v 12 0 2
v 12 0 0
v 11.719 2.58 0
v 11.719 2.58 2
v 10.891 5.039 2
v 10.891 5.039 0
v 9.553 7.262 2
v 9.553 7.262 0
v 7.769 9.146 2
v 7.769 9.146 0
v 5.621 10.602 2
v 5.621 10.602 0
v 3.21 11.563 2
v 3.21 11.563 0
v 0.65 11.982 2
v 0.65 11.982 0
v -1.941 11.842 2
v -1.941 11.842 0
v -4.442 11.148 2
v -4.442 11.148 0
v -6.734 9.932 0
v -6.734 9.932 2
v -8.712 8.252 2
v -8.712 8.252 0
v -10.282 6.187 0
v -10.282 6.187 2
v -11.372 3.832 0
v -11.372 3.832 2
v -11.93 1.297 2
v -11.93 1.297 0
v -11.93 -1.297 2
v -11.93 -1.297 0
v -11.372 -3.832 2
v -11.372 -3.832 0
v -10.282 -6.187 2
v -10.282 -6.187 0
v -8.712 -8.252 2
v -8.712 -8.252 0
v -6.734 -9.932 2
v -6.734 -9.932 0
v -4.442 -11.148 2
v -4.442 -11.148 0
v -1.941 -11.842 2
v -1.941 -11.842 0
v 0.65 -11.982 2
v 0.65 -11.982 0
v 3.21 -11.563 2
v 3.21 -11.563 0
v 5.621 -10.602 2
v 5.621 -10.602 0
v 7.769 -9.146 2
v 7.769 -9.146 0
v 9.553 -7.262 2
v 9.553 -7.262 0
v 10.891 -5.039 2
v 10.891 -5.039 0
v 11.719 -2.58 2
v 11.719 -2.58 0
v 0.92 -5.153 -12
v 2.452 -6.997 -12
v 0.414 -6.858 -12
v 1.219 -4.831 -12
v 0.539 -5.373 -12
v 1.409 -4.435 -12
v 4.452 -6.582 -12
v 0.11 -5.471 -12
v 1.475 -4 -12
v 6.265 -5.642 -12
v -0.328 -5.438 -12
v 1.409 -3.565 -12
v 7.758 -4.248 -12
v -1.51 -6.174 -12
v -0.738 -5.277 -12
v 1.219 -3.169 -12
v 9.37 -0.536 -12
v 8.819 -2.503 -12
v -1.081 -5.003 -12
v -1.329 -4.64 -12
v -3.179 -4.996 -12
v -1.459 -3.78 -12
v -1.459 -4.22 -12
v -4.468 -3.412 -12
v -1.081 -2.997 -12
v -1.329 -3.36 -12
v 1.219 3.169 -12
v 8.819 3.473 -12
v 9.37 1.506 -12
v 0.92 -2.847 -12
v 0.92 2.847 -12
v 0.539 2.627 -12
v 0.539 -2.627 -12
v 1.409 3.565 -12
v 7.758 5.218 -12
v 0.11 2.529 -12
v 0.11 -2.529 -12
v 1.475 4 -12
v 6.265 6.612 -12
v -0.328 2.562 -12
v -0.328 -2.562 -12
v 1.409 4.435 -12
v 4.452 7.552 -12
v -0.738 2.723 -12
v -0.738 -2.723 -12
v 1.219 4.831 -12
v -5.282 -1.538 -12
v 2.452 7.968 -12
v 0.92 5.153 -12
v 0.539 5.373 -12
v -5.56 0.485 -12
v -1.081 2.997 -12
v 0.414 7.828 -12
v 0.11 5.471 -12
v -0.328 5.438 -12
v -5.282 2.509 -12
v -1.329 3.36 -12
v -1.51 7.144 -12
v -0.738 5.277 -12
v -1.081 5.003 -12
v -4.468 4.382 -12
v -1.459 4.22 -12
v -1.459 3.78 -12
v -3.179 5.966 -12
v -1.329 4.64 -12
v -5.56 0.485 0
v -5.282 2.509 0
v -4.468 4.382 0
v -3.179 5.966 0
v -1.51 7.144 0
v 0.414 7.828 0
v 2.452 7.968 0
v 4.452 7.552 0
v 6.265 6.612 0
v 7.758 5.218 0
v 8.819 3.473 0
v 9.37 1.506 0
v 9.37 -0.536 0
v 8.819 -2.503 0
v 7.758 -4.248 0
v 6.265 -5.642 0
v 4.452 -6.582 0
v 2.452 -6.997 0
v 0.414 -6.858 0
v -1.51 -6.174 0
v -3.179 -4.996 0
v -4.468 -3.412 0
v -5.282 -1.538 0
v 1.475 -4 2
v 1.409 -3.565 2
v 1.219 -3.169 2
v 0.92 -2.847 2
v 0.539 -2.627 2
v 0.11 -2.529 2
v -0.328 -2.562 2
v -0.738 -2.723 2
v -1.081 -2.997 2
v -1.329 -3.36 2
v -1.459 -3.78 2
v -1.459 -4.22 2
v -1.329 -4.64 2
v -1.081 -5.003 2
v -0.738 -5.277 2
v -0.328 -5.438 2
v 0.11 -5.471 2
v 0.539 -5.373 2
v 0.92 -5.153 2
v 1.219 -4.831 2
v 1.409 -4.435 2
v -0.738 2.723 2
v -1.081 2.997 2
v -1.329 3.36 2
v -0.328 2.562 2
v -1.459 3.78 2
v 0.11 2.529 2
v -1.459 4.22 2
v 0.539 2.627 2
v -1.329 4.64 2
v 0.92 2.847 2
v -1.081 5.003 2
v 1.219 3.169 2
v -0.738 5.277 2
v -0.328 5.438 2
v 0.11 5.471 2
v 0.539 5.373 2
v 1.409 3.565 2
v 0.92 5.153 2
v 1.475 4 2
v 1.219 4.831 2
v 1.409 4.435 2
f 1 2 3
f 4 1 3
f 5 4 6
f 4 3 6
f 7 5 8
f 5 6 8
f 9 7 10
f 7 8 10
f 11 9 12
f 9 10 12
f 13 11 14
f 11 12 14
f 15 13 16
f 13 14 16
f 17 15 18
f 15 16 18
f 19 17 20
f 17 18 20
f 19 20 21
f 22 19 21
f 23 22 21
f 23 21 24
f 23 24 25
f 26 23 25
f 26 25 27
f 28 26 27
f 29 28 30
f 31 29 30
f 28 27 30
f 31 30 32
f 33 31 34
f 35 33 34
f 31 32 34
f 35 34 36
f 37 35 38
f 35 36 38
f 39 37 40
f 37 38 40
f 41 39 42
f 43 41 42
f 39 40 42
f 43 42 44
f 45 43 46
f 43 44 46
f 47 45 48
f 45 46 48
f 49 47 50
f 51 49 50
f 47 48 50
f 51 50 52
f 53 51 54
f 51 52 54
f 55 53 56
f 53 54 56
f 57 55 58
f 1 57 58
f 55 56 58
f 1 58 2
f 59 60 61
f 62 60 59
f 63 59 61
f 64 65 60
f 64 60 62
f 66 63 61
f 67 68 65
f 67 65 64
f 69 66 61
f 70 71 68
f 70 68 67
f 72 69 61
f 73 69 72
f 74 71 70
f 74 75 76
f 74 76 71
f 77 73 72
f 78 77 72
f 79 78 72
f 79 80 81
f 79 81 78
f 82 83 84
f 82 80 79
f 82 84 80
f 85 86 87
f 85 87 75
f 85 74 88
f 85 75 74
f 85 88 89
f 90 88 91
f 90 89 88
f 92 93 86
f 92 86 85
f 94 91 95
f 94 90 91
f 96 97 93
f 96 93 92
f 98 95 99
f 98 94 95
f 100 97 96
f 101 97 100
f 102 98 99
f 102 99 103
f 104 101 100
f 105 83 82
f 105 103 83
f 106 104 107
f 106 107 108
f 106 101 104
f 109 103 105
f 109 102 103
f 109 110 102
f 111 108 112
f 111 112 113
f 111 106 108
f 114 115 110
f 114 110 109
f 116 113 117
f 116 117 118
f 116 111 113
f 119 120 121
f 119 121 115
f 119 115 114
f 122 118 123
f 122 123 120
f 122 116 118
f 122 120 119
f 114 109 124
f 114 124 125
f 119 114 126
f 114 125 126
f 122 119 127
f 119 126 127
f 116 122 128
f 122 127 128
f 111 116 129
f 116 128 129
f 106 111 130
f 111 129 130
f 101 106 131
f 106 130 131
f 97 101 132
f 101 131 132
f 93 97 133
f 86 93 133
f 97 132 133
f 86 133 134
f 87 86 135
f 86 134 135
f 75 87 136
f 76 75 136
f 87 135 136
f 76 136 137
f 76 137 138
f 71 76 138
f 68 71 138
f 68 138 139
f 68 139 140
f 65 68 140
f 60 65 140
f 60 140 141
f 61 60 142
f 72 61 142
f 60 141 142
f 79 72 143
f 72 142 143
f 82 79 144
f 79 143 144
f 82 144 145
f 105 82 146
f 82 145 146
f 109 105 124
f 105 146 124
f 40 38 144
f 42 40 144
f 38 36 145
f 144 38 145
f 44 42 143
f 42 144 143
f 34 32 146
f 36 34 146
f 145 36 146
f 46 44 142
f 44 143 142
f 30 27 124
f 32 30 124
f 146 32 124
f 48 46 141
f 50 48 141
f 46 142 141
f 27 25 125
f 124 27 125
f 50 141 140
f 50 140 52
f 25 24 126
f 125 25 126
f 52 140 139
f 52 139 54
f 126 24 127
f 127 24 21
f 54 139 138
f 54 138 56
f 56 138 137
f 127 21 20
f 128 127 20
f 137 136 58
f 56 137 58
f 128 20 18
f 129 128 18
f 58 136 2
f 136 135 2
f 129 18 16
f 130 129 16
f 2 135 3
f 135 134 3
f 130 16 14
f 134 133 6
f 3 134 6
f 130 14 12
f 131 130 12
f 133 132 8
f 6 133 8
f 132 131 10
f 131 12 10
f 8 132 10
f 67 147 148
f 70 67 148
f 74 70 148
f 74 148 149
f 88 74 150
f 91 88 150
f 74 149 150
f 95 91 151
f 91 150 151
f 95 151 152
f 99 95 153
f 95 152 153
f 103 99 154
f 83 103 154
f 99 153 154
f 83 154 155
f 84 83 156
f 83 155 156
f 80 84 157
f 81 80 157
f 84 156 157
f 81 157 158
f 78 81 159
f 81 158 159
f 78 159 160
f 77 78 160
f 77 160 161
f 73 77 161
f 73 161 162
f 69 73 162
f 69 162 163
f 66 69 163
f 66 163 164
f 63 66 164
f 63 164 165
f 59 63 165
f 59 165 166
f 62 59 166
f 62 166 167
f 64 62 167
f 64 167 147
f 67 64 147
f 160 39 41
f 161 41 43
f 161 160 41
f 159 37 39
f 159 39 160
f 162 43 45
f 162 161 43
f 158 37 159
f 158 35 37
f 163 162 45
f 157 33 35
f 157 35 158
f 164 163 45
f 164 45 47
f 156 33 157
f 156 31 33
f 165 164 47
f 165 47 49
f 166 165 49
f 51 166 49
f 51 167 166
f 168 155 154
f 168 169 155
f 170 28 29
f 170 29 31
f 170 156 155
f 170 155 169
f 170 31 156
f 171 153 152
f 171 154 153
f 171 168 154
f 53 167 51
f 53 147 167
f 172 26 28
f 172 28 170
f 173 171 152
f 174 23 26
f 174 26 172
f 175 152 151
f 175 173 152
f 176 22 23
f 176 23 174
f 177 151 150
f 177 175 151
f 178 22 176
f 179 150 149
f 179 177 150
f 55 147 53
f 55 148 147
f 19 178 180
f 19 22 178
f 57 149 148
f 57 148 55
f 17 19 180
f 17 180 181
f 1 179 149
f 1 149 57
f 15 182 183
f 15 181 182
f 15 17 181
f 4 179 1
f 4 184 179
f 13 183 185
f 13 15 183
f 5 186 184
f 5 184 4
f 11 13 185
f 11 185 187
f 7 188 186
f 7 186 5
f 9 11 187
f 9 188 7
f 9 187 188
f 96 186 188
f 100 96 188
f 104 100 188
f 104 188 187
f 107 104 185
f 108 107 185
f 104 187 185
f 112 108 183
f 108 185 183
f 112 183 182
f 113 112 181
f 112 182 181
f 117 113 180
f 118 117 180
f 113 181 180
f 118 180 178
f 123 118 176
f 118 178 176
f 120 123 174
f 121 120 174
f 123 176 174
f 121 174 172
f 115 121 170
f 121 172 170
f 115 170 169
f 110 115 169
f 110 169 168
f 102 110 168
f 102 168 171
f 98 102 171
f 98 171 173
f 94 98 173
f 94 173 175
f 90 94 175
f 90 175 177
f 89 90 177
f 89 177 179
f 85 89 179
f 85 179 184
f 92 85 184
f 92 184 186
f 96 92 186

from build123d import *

# Parameters (mm, degrees)
SKETCH1_R           = 12
BOSS_EXTRUDE2_DEPTH = 2
SKETCH2_R           = 7.5
BOSS_EXTRUDE3_DEPTH = 12
SKETCH3_R           = 1.35
CUT_EXTRUDE2_DEPTH  = 23
SKETCH4_R           = 1.475
CUT_EXTRUDE4_DEPTH  = 18


with BuildPart() as part:
    # Sketch1 → Boss-Extrude2 (new body)
    with BuildSketch(Plane.XY):
        Circle(SKETCH1_R)
    extrude(amount=BOSS_EXTRUDE2_DEPTH)

    # Sketch2 → Boss-Extrude3 (add)
    with BuildSketch(Plane(origin=(0, 0, 0), x_dir=(-1, 0, 0), z_dir=(0, 0, -1))):
        with Locations((-1.940285, 0.48507125)):
            Circle(SKETCH2_R)
    extrude(amount=BOSS_EXTRUDE3_DEPTH)

    # Sketch3 → Cut-Extrude2 (cut, through all)
    with BuildSketch(Plane.XY.offset(2)):
        with Locations((0, 4)):
            Circle(SKETCH3_R)
        with Locations((0, -4)):
            Circle(SKETCH3_R)
    extrude(amount=-CUT_EXTRUDE2_DEPTH, mode=Mode.SUBTRACT)

    # Sketch4 → Cut-Extrude4 (cut)
    with BuildSketch(Plane.XY.offset(2)):
        with Locations((0, 4)):
            Circle(SKETCH4_R)
        with Locations((0, -4)):
            Circle(SKETCH4_R)
    extrude(amount=-CUT_EXTRUDE4_DEPTH, mode=Mode.SUBTRACT)


solid = part.part
